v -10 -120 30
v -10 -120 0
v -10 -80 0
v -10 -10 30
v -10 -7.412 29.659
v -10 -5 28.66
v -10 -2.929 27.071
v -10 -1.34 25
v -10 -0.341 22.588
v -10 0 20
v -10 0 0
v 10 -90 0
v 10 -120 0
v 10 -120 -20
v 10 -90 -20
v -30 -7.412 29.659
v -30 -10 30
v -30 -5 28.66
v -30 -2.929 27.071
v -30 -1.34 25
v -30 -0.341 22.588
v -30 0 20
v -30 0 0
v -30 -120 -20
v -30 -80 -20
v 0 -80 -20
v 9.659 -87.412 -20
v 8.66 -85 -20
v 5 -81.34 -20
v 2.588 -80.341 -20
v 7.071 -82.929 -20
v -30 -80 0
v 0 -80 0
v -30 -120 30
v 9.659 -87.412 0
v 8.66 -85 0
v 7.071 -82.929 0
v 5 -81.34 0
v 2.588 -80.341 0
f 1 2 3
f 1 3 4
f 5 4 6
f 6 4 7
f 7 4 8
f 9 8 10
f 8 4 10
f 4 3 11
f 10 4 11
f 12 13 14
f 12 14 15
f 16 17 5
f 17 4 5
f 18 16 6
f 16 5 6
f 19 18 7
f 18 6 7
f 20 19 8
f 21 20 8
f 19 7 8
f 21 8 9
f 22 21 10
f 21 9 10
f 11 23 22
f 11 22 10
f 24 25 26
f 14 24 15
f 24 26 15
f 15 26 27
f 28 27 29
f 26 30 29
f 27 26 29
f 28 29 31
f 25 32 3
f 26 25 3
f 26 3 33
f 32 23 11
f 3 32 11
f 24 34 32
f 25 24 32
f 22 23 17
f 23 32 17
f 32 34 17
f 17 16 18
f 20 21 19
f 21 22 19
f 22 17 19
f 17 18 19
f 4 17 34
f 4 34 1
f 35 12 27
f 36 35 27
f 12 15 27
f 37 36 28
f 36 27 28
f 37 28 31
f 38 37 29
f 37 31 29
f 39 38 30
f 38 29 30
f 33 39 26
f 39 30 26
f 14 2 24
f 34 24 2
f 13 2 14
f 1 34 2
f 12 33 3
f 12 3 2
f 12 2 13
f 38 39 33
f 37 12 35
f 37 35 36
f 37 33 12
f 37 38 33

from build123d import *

# Parameters (mm, degrees)
SKETCH1_W           = 20
SKETCH1_H           = 120
BOSS_EXTRUDE1_DEPTH = 30
SKETCH2_W           = 40
SKETCH2_H           = 40
BOSS_EXTRUDE2_DEPTH = 20
FILLET1_R           = 10


with BuildPart() as part:
    # Sketch1 → Boss-Extrude1 (new body)
    with BuildSketch(Plane.XY):
        with Locations((-20, -60)):
            Rectangle(SKETCH1_W, SKETCH1_H)
    extrude(amount=BOSS_EXTRUDE1_DEPTH)

    # Sketch2 → Boss-Extrude2 (add)
    with BuildSketch(Plane.XY):
        with Locations((-10, -100)):
            Rectangle(SKETCH2_W, SKETCH2_H)
    extrude(amount=-BOSS_EXTRUDE2_DEPTH)

    # Fillet1
    fillet1_edges = [part.edges().sort_by_distance(p)[0] for p in [
        (10, -80, -10),
        (-20, 0, 30),
    ]]
    fillet(fillet1_edges, radius=FILLET1_R)


solid = part.part
